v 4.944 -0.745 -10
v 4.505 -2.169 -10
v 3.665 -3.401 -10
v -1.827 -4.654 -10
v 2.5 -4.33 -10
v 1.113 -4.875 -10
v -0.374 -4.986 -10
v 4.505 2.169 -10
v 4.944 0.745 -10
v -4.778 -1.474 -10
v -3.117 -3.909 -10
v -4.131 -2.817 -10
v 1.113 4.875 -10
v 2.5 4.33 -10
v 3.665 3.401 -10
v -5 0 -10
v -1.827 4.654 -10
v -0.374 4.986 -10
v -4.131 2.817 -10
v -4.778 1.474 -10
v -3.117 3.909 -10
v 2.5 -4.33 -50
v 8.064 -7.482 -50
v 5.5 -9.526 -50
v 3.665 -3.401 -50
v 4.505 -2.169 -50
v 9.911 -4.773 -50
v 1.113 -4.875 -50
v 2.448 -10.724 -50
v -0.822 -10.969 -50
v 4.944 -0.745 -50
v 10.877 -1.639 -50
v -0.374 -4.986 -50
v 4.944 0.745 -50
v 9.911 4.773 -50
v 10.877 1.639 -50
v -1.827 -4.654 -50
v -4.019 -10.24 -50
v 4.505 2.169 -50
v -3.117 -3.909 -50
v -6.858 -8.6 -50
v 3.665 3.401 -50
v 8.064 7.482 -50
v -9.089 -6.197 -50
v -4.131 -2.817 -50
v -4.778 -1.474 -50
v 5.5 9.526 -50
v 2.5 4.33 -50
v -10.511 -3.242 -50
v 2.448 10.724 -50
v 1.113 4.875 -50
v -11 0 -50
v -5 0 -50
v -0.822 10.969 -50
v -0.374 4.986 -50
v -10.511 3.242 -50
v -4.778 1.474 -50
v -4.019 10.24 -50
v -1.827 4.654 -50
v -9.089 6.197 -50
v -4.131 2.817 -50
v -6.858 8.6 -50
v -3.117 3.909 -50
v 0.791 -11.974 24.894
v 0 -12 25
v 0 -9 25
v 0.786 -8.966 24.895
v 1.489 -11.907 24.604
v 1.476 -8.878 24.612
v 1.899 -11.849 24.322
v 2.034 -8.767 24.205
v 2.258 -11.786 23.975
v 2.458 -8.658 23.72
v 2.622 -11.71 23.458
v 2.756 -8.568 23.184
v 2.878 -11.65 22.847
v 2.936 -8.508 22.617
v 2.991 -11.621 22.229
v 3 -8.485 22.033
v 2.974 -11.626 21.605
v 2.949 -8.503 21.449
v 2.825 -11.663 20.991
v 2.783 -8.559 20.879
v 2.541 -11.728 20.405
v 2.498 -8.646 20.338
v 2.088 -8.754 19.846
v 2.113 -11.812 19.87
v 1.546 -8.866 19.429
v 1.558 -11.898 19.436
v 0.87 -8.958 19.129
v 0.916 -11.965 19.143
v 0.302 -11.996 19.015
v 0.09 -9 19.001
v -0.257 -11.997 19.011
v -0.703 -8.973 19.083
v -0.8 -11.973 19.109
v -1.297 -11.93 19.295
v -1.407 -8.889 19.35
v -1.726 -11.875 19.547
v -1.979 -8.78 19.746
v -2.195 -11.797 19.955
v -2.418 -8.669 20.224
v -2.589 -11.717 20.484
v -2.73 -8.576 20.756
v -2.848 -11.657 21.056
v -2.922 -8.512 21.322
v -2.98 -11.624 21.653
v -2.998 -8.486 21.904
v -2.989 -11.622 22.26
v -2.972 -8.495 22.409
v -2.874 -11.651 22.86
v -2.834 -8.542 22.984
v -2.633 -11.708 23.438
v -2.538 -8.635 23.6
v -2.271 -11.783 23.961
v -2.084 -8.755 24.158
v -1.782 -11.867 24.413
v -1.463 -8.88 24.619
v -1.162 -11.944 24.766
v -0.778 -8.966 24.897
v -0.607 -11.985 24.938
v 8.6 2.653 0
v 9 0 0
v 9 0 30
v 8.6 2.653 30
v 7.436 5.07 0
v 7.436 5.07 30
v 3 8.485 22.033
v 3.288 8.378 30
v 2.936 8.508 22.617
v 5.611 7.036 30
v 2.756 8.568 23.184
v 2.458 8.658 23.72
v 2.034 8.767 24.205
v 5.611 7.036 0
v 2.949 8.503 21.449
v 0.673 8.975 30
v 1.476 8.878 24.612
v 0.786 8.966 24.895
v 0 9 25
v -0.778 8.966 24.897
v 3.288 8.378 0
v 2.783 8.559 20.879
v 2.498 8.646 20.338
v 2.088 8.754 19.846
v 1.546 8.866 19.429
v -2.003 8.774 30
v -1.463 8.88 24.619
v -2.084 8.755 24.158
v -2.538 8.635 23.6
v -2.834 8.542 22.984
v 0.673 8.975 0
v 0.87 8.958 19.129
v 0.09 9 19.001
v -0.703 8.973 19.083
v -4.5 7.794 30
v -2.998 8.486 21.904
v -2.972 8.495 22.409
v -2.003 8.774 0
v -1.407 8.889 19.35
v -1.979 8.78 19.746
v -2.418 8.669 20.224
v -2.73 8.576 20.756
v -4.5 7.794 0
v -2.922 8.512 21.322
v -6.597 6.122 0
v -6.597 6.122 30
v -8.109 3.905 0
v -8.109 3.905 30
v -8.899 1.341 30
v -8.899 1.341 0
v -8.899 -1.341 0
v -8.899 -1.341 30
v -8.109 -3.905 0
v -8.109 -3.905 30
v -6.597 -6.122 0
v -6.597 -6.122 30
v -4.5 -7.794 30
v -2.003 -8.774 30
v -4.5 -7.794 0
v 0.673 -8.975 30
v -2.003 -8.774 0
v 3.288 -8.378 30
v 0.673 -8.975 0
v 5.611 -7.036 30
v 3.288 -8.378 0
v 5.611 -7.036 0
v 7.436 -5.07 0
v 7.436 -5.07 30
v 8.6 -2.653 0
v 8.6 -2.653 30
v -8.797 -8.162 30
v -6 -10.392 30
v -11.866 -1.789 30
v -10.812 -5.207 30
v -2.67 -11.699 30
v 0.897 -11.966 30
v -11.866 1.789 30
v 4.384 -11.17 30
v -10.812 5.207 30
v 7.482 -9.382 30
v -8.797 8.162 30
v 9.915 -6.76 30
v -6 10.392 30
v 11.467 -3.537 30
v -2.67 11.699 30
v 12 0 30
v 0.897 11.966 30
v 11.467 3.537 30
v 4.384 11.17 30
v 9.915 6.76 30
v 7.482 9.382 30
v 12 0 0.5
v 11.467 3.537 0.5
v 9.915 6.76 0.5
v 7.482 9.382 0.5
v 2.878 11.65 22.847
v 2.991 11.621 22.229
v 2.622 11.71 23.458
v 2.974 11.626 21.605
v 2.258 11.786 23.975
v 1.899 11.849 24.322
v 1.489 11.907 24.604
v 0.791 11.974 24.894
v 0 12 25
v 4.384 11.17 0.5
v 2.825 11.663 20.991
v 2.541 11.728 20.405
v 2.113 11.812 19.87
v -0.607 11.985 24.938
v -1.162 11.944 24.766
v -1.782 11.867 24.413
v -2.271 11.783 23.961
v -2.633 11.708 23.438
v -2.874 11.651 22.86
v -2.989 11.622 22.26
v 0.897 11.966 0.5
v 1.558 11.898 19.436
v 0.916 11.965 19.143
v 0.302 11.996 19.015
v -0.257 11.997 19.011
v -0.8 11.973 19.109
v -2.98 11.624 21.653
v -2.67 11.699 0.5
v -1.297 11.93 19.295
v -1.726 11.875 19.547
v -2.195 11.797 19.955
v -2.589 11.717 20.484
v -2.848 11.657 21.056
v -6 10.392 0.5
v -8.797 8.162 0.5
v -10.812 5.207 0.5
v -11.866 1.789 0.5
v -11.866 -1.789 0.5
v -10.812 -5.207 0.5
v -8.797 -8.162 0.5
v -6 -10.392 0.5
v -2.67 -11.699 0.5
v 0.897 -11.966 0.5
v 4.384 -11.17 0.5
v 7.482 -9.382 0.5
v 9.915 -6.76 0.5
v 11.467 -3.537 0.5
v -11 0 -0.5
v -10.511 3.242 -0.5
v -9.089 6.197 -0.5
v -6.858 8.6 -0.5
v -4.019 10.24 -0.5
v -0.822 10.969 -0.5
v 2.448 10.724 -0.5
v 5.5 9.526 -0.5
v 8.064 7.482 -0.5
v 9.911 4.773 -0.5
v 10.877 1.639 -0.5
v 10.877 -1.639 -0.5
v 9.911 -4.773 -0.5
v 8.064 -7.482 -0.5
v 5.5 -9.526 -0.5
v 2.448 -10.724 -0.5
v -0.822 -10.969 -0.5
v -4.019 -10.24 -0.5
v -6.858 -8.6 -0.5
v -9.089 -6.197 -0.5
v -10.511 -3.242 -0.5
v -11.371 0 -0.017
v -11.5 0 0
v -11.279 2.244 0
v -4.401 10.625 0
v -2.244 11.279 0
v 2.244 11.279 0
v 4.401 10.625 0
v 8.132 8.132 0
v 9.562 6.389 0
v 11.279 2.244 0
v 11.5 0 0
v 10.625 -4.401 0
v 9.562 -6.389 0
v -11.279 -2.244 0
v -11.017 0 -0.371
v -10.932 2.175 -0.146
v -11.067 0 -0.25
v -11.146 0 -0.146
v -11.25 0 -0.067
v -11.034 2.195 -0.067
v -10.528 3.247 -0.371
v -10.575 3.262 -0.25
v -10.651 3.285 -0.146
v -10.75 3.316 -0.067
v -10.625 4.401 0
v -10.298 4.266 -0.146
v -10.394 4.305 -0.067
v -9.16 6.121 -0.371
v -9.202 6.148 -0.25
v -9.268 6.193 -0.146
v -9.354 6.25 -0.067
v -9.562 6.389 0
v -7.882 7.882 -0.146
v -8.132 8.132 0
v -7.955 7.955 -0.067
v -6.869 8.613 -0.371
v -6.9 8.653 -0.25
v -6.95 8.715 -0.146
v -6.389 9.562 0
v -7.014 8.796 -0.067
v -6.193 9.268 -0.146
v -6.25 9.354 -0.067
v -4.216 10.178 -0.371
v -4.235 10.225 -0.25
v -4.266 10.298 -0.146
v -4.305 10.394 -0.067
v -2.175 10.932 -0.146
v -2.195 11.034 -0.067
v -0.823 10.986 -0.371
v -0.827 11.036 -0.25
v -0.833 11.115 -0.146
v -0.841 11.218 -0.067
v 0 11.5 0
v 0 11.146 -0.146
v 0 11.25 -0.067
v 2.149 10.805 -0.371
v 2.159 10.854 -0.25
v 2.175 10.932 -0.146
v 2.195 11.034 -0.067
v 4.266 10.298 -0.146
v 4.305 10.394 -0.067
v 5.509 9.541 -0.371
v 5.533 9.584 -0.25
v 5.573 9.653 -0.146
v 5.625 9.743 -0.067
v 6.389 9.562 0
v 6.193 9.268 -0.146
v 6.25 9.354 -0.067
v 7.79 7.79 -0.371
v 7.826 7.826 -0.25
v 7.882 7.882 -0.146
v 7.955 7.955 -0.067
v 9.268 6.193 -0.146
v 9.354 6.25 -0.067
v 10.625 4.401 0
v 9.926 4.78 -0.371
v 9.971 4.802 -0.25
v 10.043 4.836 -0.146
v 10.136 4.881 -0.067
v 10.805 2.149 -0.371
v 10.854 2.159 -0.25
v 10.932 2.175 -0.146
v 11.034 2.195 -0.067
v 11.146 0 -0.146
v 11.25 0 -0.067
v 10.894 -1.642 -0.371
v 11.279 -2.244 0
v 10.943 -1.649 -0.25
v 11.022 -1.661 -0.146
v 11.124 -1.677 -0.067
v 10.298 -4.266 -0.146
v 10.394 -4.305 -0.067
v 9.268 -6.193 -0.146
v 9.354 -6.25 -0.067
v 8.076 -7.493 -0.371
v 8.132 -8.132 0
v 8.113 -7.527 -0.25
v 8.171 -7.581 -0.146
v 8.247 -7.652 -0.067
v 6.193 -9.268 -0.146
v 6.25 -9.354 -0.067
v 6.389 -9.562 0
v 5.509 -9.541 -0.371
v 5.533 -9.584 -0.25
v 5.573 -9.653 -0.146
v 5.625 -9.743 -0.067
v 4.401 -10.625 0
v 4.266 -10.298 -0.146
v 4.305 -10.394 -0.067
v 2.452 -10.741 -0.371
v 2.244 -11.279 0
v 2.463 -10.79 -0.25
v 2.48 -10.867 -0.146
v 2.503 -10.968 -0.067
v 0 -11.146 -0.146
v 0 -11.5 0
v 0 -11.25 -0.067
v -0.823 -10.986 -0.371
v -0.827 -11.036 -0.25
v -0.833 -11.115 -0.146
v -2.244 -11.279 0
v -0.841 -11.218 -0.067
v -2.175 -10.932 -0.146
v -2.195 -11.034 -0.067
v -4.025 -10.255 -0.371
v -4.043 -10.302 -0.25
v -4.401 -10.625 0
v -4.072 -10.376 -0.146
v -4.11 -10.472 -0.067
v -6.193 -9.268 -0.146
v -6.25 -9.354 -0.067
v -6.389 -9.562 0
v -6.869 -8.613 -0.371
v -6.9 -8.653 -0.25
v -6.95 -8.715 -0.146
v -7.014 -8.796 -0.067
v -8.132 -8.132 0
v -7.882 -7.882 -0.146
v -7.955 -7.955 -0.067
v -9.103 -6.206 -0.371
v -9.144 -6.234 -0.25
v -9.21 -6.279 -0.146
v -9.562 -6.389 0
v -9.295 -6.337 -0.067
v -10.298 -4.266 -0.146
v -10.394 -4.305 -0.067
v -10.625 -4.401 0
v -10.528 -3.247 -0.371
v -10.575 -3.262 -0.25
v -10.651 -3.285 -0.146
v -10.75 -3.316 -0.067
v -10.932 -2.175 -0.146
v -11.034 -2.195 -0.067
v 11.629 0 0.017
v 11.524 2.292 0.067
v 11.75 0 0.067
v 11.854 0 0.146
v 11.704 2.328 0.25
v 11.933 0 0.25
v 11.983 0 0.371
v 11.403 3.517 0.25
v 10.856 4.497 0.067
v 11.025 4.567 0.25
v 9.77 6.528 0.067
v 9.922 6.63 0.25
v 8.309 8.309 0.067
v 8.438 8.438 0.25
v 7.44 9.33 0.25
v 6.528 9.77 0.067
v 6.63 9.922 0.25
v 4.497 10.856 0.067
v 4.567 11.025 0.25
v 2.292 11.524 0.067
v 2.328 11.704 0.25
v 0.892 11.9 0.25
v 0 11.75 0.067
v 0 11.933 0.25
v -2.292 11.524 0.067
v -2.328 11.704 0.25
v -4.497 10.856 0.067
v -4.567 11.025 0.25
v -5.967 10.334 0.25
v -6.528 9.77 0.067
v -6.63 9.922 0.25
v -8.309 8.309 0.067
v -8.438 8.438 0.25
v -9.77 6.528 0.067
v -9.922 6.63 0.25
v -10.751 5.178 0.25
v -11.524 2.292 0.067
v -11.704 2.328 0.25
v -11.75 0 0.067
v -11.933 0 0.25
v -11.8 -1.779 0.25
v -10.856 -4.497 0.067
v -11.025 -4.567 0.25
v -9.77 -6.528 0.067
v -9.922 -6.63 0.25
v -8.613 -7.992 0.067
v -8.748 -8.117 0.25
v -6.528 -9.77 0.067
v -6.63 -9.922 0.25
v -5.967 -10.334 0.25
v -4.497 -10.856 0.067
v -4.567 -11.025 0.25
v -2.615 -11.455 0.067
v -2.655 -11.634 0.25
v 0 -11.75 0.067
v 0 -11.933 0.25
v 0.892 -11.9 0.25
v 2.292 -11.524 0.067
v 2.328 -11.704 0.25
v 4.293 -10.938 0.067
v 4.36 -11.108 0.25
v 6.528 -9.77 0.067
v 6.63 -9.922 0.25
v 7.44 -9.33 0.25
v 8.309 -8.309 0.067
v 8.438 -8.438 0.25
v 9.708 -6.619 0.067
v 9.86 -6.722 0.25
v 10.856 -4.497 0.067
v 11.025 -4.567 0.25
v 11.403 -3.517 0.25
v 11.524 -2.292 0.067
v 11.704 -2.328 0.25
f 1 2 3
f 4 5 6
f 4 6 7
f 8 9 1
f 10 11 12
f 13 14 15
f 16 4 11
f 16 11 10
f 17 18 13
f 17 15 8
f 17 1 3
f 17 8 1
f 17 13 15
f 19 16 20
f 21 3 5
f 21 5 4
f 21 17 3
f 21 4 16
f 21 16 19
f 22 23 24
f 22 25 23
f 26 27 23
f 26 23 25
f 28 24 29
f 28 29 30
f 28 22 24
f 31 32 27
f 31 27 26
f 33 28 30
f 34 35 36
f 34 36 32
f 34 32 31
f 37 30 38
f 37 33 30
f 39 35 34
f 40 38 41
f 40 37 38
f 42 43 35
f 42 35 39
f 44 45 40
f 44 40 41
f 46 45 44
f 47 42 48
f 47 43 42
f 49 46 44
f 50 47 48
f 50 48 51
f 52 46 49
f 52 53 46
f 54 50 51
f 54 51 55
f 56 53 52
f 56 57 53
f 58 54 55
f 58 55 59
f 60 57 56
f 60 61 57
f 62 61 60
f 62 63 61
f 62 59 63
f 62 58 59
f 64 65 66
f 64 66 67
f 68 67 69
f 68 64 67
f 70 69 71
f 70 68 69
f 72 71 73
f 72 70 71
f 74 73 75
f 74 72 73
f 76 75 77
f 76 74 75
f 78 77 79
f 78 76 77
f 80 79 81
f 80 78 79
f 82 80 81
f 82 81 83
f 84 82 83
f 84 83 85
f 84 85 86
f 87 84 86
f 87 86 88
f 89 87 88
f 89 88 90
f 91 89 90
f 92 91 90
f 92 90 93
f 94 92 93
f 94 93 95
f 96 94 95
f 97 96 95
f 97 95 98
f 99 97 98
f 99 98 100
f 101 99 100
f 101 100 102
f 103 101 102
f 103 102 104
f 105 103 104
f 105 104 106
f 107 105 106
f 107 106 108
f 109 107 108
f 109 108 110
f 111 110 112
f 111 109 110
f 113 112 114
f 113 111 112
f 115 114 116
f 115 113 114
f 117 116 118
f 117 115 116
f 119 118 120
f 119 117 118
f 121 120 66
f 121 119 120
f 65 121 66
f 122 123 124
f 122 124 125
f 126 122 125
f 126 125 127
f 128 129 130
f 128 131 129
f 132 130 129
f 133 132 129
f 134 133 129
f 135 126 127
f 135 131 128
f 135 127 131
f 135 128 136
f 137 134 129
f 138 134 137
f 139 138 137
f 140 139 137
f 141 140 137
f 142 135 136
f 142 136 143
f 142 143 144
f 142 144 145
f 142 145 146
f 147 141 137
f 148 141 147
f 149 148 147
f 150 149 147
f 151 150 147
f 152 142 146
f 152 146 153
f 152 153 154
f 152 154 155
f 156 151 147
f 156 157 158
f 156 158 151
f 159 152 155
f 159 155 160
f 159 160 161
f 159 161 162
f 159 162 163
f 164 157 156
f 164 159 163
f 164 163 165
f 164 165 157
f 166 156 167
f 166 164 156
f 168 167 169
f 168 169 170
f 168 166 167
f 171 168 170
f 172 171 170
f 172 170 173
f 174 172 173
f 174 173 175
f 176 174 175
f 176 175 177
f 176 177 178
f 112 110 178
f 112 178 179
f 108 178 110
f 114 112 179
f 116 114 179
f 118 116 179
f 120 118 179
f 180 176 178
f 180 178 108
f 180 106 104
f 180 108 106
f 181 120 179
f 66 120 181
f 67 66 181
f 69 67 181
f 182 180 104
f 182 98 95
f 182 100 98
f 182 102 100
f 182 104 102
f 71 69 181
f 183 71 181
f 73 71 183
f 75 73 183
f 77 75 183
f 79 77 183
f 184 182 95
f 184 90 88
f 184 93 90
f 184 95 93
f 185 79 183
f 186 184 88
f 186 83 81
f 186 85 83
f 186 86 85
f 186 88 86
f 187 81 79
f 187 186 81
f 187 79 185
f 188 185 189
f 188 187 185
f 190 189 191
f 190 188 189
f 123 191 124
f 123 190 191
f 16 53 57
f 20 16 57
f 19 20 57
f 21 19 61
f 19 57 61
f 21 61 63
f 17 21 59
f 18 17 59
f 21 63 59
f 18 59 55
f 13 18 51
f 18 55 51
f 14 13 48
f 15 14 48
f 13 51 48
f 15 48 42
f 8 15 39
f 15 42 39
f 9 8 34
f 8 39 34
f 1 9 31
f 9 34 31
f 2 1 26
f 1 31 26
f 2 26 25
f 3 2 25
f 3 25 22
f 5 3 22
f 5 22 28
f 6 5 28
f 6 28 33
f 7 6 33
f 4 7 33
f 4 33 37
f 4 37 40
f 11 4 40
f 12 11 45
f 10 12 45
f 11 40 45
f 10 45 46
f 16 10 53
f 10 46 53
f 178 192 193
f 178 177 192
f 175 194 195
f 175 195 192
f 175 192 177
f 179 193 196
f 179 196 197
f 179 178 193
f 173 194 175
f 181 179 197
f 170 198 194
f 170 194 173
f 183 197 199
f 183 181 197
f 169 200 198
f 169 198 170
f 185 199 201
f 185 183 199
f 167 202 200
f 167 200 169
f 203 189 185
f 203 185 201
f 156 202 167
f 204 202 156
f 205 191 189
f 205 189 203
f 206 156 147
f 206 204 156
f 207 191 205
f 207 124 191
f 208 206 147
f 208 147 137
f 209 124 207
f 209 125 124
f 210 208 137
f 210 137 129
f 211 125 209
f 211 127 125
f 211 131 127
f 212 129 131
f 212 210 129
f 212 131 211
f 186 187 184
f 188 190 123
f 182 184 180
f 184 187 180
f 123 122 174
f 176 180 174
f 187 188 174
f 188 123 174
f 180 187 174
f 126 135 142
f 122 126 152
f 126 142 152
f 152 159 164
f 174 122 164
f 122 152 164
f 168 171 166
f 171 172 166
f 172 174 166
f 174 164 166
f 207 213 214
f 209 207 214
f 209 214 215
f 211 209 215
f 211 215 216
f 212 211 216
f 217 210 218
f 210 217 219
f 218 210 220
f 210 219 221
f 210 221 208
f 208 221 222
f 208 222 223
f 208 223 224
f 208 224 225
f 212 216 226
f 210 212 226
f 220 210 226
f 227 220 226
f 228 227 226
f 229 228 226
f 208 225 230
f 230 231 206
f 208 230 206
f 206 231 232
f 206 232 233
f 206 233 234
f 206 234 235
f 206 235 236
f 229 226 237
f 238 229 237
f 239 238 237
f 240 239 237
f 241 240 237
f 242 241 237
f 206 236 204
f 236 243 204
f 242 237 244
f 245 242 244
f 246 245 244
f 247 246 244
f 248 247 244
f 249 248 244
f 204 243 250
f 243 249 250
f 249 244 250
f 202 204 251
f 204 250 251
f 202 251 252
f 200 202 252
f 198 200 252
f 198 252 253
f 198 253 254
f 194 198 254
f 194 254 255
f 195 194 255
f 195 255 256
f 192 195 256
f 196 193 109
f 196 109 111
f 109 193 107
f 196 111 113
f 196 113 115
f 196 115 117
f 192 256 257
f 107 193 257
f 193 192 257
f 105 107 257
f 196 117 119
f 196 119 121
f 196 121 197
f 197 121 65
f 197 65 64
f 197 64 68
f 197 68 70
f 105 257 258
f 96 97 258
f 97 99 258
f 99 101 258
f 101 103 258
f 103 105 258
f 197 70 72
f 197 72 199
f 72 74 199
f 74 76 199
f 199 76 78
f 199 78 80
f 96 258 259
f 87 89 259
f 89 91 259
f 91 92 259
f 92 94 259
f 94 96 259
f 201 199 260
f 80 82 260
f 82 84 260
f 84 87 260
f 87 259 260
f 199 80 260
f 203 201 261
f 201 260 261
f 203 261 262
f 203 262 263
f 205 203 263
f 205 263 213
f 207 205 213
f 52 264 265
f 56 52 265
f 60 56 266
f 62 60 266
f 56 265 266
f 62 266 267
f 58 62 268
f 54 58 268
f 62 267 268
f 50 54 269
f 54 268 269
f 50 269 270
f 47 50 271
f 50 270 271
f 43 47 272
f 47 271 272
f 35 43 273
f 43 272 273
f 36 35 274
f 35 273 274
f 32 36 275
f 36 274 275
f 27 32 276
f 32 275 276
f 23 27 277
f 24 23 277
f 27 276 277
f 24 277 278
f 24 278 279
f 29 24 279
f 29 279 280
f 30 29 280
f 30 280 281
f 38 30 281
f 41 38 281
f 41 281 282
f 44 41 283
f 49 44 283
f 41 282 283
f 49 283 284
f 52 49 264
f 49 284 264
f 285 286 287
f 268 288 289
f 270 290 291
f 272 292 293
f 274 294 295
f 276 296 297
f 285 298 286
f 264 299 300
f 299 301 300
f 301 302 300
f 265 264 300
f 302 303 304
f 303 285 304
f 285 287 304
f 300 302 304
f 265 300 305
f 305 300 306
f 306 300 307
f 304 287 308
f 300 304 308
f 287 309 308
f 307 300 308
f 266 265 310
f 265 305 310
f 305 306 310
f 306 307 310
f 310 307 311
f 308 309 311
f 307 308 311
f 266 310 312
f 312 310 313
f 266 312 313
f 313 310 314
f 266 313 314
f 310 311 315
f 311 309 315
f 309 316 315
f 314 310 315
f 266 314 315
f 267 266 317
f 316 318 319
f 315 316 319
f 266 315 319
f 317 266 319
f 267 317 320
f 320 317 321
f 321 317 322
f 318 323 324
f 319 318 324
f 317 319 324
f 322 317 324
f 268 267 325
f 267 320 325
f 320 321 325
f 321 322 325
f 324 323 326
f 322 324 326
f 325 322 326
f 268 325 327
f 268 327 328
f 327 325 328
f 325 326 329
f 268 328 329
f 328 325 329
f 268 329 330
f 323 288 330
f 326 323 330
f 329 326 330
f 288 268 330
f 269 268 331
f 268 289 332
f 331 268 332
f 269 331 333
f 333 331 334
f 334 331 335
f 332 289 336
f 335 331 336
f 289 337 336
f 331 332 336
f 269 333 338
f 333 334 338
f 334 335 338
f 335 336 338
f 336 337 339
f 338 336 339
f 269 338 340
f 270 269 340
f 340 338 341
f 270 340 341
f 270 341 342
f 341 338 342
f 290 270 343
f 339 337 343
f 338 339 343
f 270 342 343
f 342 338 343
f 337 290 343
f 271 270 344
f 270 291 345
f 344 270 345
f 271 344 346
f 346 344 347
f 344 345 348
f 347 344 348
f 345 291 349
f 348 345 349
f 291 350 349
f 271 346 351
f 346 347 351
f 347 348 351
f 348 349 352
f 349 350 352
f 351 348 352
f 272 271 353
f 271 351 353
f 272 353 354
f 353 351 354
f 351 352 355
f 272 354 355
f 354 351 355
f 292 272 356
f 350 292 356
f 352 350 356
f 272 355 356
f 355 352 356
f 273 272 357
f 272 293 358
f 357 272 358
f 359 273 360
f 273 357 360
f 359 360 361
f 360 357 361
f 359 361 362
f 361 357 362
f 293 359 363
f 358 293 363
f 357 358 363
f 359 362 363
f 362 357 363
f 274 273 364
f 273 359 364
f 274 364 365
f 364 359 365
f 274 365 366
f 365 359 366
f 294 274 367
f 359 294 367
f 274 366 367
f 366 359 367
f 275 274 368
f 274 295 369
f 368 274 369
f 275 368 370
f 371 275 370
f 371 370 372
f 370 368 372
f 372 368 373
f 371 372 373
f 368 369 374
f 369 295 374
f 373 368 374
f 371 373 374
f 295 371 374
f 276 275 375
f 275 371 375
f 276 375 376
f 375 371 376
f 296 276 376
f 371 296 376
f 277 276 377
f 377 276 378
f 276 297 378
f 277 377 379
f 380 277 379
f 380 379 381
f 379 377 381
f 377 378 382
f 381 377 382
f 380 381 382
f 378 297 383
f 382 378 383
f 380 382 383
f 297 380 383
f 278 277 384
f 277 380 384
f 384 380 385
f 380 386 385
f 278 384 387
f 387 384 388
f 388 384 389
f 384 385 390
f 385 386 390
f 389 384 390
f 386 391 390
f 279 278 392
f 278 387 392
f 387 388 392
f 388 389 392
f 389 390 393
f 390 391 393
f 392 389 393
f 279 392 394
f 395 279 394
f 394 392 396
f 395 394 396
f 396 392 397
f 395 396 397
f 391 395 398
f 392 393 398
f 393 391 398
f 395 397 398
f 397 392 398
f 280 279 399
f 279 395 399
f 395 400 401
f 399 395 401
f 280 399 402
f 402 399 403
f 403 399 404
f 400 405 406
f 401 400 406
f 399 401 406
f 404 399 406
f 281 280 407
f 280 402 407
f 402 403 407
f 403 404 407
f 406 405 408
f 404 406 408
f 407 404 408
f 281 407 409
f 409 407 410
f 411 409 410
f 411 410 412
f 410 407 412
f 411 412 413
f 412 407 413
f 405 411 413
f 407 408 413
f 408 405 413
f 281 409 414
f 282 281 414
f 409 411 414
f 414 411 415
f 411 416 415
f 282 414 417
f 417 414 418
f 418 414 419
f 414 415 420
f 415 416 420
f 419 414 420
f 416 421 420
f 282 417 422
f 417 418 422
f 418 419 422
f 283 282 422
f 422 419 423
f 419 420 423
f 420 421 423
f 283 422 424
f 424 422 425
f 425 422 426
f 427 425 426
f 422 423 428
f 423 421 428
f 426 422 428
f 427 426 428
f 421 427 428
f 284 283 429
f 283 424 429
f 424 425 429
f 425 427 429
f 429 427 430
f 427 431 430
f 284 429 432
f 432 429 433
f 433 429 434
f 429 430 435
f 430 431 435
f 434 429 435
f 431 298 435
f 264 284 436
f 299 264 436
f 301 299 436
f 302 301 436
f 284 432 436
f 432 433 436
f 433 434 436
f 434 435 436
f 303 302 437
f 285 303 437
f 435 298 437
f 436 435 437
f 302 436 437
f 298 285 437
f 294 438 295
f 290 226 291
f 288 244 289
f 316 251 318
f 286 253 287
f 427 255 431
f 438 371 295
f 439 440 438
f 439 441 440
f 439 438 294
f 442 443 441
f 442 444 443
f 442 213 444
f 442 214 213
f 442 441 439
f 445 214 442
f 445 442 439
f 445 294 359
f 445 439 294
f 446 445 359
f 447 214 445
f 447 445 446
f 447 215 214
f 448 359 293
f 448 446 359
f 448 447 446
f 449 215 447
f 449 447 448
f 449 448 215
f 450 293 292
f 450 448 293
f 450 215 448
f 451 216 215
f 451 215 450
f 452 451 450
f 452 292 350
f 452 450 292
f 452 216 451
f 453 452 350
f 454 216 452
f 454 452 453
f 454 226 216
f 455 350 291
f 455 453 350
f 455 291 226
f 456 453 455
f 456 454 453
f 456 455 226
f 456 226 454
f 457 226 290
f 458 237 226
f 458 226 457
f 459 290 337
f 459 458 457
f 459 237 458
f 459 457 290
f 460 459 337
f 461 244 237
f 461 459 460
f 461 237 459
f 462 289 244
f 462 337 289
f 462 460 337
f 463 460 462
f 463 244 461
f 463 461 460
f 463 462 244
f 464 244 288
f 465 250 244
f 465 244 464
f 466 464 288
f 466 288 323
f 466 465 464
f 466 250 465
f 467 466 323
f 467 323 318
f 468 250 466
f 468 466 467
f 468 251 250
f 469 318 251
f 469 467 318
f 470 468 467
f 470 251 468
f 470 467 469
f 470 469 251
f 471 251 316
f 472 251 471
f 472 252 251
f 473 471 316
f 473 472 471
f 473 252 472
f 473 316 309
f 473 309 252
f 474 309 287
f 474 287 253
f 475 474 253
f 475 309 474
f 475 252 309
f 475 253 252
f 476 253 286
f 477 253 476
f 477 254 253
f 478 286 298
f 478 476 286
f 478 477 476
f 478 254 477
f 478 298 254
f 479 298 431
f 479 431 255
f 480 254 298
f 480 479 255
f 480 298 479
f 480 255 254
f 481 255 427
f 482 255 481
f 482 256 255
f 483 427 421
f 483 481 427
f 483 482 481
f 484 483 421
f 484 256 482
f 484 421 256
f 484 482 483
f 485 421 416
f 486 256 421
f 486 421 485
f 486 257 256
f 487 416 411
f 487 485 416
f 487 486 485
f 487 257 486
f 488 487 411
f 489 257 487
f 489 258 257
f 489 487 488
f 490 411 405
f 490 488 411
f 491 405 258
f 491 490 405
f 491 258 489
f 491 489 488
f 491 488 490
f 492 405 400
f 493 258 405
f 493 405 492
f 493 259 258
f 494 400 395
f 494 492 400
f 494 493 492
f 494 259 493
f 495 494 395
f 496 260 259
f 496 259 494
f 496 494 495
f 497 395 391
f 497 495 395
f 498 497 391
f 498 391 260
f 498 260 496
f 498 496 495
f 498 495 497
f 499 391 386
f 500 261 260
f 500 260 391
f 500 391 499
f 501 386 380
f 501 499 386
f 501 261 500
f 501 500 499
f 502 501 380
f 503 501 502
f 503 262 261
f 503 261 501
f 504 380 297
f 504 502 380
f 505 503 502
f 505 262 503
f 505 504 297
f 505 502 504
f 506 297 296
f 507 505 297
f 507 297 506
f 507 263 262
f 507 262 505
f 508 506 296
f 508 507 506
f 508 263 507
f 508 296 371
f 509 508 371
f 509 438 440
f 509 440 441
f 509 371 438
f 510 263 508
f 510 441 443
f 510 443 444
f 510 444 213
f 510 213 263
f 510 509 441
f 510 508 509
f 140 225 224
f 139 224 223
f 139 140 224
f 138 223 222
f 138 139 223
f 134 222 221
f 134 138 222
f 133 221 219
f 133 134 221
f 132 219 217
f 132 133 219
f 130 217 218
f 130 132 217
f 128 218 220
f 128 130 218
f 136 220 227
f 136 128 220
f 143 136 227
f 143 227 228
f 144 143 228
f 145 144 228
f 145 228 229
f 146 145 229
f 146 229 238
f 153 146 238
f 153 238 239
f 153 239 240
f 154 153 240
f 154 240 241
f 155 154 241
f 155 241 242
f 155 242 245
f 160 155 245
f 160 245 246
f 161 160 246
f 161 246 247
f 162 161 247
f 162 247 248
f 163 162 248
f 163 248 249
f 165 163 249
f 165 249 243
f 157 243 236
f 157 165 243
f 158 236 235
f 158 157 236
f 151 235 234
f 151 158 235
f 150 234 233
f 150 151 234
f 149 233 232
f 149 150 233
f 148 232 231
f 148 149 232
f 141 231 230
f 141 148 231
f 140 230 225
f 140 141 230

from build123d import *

# Parameters (mm, degrees)
SKETCH1_R               = 12
SKETCH1_R_2             = 9
BOSS_EXTRUDE1_DEPTH     = 30
SKETCH2_R               = 11
BOSS_EXTRUDE2_DEPTH     = 50
SKETCH3_R               = 5
CUT_EXTRUDE1_DEPTH      = 40
CUT_EXTRUDE2_DEPTH      = 53.80151513
CUT_EXTRUDE2_DEPTH_BACK = 53.80151513
SKETCH4_R               = 3
FILLET1_R               = 0.5


with BuildPart() as part:
    # Sketch1 → Boss-Extrude1 (new body)
    with BuildSketch(Plane.XY):
        Circle(SKETCH1_R)
        Circle(SKETCH1_R_2, mode=Mode.SUBTRACT)
    extrude(amount=BOSS_EXTRUDE1_DEPTH)

    # Sketch2 → Boss-Extrude2 (add)
    with BuildSketch(Plane(origin=(0, 0, 0), x_dir=(-1, 0, 0), z_dir=(0, 0, -1))):
        Circle(SKETCH2_R)
    extrude(amount=BOSS_EXTRUDE2_DEPTH)

    # Sketch3 → Cut-Extrude1 (cut)
    with BuildSketch(Plane(origin=(0, 0, -50), x_dir=(-1, 0, 0), z_dir=(0, 0, -1))):
        Circle(SKETCH3_R)
    extrude(amount=-CUT_EXTRUDE1_DEPTH, mode=Mode.SUBTRACT)

    # Sketch4 → Cut-Extrude2 (cut, two sides: drawn at the far end of the back side and taken through both)
    with BuildSketch(Plane(origin=(0, 0, 0), x_dir=(1, 0, 0), z_dir=(0, 1, 0)).offset(-CUT_EXTRUDE2_DEPTH_BACK)):
        with Locations(Location((0, -22, 0), (0, 0, 270))):
            Circle(SKETCH4_R)
    extrude(amount=CUT_EXTRUDE2_DEPTH + CUT_EXTRUDE2_DEPTH_BACK, mode=Mode.SUBTRACT)

    # Fillet1
    fillet1_edges = [part.edges().sort_by_distance(p)[0] for p in [
        (-12, 0, 0),
        (11, 0, 0),
    ]]
    fillet(fillet1_edges, radius=FILLET1_R - 0.0001)  # a hair under: the kernel refuses the full size


solid = part.part
